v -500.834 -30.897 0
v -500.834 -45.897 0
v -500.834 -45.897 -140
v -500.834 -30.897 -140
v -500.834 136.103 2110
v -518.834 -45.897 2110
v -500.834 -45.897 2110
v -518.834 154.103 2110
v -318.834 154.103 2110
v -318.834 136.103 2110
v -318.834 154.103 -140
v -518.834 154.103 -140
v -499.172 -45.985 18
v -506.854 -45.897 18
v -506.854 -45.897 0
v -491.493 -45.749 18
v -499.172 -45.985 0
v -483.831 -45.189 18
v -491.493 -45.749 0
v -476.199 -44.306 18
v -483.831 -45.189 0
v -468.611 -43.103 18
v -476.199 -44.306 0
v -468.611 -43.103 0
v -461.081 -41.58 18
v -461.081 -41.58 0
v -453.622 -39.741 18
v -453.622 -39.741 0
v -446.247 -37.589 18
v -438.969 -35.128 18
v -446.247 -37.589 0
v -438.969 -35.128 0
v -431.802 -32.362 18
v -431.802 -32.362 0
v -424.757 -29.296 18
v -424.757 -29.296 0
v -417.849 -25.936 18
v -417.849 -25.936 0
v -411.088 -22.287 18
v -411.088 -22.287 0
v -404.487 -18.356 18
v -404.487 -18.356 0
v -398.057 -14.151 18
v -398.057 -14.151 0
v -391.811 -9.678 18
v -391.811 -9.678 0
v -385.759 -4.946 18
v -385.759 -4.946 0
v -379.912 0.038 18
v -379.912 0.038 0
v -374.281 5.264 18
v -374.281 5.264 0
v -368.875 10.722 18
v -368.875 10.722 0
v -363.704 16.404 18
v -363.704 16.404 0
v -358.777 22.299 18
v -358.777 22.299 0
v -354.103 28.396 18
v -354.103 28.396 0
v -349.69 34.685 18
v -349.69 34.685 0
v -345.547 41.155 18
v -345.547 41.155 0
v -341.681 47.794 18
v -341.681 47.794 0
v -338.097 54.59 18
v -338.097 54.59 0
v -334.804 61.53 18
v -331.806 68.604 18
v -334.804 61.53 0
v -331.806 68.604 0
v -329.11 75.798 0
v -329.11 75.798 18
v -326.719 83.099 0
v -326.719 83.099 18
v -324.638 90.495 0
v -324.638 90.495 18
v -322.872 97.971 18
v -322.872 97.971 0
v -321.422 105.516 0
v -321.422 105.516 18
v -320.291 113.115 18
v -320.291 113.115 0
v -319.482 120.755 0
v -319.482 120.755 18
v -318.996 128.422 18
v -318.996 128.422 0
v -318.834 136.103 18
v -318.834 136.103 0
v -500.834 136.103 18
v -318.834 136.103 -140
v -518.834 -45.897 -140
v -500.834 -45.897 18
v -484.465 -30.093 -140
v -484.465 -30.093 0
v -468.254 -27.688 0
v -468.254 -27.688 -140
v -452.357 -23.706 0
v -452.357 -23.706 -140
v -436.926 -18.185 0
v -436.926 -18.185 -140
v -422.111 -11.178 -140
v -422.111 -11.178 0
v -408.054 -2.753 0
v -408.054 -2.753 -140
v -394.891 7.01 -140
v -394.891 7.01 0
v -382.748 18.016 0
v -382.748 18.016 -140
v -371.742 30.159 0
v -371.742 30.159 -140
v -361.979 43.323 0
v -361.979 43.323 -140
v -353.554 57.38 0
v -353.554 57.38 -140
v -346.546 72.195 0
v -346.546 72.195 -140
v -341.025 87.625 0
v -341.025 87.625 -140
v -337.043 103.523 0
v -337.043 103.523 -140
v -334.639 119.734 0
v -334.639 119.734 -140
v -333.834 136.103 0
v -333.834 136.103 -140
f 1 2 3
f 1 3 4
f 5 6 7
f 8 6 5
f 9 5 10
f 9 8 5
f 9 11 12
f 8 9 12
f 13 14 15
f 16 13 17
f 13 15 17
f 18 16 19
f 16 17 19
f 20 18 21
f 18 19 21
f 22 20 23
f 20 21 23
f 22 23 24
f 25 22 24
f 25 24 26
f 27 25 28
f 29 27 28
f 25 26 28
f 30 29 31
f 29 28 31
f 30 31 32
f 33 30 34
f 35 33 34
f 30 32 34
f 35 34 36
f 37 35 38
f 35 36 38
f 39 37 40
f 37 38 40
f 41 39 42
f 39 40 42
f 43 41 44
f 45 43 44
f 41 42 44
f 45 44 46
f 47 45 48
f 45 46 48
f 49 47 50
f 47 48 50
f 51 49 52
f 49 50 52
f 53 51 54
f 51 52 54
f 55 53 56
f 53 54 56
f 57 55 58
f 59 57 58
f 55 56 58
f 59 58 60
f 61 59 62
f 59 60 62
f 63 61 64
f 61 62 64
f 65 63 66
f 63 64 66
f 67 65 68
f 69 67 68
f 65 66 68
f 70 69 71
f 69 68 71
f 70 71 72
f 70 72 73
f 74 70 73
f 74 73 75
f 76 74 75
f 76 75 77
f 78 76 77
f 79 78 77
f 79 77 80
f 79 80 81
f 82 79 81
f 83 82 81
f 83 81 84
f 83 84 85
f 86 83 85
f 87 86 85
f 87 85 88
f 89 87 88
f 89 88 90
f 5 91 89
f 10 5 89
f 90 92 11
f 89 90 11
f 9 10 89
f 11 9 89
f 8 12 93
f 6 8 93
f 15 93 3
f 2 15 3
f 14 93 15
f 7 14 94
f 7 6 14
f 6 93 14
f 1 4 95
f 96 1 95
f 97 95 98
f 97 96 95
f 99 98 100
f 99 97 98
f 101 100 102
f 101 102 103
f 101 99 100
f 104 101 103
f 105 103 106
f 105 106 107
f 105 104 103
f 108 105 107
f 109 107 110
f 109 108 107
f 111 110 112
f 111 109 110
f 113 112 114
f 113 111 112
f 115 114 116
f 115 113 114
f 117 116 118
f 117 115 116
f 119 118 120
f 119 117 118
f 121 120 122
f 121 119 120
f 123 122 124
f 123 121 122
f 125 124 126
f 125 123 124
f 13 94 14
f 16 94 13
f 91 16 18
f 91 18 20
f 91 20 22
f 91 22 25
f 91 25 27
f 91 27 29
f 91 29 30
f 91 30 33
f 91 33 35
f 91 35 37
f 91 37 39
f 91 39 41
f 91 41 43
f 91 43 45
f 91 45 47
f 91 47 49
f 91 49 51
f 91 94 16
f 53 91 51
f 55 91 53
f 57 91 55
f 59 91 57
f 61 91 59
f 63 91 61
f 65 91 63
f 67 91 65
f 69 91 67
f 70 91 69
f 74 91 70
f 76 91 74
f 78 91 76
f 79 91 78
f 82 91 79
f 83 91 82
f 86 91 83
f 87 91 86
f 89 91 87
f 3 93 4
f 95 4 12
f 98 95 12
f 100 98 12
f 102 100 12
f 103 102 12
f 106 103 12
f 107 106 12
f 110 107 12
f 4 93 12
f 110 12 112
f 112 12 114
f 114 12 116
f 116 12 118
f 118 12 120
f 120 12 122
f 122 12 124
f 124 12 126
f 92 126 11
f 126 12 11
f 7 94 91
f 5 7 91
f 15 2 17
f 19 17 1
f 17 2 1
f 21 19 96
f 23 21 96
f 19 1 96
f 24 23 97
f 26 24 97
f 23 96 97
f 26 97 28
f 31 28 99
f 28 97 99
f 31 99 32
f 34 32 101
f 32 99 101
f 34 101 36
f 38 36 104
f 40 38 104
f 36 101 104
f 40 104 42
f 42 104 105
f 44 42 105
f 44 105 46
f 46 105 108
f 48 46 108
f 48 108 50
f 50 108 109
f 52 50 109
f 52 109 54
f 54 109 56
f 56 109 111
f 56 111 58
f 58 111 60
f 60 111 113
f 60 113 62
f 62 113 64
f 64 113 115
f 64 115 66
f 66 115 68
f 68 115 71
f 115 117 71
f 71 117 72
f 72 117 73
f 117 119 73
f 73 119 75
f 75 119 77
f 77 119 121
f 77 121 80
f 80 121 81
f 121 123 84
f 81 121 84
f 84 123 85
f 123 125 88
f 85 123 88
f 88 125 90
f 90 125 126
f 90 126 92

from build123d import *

# Parameters (mm, degrees)
F1_DEPTH = 2110
F3_DEPTH = 18
F5_DEPTH = 140


with BuildPart() as f1:
    # F0 (on Top) → F1 (new body)
    with BuildSketch(Plane.XY):
        Polygon((-318.834358, 154.102758), (-518.834358, 154.102758), (-518.834358, -45.897242), (-500.834358, -45.897242), (-500.834358, 136.102758), (-336.834358, 136.102758), (-318.834358, 136.102758), align=None)
    extrude(amount=F1_DEPTH)

    # F2 (on Top) → F3 (join)
    with BuildSketch(Plane.XY):
        with BuildLine():
            Line((-318.834358, 154.102758), (-518.834358, 154.102758))
            Line((-518.834358, 154.102758), (-518.834358, -45.897242))
            Line((-518.834358, -45.897242), (-506.854117, -45.897242))
            ThreePointArc((-506.854117, -45.897242), (-374.280698, 5.263707), (-318.834358, 136.102758))
            Line((-318.834358, 136.102758), (-318.834358, 154.102758))
        make_face()
    extrude(amount=F3_DEPTH)

    # F4 (on Top) → F5 (join)
    with BuildSketch(Plane.XY):
        with BuildLine():
            Line((-318.834358, 154.102758), (-518.834358, 154.102758))
            Line((-518.834358, 154.102758), (-518.834358, -45.897242))
            Line((-518.834358, -45.897242), (-500.834358, -45.897242))
            Line((-500.834358, -45.897242), (-500.834358, -30.897242))
            ThreePointArc((-500.834358, -30.897242), (-382.747526, 18.015926), (-333.834358, 136.102758))
            Line((-333.834358, 136.102758), (-318.834358, 136.102758))
            Line((-318.834358, 136.102758), (-318.834358, 154.102758))
        make_face()
    extrude(amount=-F5_DEPTH)


solid = f1.part
